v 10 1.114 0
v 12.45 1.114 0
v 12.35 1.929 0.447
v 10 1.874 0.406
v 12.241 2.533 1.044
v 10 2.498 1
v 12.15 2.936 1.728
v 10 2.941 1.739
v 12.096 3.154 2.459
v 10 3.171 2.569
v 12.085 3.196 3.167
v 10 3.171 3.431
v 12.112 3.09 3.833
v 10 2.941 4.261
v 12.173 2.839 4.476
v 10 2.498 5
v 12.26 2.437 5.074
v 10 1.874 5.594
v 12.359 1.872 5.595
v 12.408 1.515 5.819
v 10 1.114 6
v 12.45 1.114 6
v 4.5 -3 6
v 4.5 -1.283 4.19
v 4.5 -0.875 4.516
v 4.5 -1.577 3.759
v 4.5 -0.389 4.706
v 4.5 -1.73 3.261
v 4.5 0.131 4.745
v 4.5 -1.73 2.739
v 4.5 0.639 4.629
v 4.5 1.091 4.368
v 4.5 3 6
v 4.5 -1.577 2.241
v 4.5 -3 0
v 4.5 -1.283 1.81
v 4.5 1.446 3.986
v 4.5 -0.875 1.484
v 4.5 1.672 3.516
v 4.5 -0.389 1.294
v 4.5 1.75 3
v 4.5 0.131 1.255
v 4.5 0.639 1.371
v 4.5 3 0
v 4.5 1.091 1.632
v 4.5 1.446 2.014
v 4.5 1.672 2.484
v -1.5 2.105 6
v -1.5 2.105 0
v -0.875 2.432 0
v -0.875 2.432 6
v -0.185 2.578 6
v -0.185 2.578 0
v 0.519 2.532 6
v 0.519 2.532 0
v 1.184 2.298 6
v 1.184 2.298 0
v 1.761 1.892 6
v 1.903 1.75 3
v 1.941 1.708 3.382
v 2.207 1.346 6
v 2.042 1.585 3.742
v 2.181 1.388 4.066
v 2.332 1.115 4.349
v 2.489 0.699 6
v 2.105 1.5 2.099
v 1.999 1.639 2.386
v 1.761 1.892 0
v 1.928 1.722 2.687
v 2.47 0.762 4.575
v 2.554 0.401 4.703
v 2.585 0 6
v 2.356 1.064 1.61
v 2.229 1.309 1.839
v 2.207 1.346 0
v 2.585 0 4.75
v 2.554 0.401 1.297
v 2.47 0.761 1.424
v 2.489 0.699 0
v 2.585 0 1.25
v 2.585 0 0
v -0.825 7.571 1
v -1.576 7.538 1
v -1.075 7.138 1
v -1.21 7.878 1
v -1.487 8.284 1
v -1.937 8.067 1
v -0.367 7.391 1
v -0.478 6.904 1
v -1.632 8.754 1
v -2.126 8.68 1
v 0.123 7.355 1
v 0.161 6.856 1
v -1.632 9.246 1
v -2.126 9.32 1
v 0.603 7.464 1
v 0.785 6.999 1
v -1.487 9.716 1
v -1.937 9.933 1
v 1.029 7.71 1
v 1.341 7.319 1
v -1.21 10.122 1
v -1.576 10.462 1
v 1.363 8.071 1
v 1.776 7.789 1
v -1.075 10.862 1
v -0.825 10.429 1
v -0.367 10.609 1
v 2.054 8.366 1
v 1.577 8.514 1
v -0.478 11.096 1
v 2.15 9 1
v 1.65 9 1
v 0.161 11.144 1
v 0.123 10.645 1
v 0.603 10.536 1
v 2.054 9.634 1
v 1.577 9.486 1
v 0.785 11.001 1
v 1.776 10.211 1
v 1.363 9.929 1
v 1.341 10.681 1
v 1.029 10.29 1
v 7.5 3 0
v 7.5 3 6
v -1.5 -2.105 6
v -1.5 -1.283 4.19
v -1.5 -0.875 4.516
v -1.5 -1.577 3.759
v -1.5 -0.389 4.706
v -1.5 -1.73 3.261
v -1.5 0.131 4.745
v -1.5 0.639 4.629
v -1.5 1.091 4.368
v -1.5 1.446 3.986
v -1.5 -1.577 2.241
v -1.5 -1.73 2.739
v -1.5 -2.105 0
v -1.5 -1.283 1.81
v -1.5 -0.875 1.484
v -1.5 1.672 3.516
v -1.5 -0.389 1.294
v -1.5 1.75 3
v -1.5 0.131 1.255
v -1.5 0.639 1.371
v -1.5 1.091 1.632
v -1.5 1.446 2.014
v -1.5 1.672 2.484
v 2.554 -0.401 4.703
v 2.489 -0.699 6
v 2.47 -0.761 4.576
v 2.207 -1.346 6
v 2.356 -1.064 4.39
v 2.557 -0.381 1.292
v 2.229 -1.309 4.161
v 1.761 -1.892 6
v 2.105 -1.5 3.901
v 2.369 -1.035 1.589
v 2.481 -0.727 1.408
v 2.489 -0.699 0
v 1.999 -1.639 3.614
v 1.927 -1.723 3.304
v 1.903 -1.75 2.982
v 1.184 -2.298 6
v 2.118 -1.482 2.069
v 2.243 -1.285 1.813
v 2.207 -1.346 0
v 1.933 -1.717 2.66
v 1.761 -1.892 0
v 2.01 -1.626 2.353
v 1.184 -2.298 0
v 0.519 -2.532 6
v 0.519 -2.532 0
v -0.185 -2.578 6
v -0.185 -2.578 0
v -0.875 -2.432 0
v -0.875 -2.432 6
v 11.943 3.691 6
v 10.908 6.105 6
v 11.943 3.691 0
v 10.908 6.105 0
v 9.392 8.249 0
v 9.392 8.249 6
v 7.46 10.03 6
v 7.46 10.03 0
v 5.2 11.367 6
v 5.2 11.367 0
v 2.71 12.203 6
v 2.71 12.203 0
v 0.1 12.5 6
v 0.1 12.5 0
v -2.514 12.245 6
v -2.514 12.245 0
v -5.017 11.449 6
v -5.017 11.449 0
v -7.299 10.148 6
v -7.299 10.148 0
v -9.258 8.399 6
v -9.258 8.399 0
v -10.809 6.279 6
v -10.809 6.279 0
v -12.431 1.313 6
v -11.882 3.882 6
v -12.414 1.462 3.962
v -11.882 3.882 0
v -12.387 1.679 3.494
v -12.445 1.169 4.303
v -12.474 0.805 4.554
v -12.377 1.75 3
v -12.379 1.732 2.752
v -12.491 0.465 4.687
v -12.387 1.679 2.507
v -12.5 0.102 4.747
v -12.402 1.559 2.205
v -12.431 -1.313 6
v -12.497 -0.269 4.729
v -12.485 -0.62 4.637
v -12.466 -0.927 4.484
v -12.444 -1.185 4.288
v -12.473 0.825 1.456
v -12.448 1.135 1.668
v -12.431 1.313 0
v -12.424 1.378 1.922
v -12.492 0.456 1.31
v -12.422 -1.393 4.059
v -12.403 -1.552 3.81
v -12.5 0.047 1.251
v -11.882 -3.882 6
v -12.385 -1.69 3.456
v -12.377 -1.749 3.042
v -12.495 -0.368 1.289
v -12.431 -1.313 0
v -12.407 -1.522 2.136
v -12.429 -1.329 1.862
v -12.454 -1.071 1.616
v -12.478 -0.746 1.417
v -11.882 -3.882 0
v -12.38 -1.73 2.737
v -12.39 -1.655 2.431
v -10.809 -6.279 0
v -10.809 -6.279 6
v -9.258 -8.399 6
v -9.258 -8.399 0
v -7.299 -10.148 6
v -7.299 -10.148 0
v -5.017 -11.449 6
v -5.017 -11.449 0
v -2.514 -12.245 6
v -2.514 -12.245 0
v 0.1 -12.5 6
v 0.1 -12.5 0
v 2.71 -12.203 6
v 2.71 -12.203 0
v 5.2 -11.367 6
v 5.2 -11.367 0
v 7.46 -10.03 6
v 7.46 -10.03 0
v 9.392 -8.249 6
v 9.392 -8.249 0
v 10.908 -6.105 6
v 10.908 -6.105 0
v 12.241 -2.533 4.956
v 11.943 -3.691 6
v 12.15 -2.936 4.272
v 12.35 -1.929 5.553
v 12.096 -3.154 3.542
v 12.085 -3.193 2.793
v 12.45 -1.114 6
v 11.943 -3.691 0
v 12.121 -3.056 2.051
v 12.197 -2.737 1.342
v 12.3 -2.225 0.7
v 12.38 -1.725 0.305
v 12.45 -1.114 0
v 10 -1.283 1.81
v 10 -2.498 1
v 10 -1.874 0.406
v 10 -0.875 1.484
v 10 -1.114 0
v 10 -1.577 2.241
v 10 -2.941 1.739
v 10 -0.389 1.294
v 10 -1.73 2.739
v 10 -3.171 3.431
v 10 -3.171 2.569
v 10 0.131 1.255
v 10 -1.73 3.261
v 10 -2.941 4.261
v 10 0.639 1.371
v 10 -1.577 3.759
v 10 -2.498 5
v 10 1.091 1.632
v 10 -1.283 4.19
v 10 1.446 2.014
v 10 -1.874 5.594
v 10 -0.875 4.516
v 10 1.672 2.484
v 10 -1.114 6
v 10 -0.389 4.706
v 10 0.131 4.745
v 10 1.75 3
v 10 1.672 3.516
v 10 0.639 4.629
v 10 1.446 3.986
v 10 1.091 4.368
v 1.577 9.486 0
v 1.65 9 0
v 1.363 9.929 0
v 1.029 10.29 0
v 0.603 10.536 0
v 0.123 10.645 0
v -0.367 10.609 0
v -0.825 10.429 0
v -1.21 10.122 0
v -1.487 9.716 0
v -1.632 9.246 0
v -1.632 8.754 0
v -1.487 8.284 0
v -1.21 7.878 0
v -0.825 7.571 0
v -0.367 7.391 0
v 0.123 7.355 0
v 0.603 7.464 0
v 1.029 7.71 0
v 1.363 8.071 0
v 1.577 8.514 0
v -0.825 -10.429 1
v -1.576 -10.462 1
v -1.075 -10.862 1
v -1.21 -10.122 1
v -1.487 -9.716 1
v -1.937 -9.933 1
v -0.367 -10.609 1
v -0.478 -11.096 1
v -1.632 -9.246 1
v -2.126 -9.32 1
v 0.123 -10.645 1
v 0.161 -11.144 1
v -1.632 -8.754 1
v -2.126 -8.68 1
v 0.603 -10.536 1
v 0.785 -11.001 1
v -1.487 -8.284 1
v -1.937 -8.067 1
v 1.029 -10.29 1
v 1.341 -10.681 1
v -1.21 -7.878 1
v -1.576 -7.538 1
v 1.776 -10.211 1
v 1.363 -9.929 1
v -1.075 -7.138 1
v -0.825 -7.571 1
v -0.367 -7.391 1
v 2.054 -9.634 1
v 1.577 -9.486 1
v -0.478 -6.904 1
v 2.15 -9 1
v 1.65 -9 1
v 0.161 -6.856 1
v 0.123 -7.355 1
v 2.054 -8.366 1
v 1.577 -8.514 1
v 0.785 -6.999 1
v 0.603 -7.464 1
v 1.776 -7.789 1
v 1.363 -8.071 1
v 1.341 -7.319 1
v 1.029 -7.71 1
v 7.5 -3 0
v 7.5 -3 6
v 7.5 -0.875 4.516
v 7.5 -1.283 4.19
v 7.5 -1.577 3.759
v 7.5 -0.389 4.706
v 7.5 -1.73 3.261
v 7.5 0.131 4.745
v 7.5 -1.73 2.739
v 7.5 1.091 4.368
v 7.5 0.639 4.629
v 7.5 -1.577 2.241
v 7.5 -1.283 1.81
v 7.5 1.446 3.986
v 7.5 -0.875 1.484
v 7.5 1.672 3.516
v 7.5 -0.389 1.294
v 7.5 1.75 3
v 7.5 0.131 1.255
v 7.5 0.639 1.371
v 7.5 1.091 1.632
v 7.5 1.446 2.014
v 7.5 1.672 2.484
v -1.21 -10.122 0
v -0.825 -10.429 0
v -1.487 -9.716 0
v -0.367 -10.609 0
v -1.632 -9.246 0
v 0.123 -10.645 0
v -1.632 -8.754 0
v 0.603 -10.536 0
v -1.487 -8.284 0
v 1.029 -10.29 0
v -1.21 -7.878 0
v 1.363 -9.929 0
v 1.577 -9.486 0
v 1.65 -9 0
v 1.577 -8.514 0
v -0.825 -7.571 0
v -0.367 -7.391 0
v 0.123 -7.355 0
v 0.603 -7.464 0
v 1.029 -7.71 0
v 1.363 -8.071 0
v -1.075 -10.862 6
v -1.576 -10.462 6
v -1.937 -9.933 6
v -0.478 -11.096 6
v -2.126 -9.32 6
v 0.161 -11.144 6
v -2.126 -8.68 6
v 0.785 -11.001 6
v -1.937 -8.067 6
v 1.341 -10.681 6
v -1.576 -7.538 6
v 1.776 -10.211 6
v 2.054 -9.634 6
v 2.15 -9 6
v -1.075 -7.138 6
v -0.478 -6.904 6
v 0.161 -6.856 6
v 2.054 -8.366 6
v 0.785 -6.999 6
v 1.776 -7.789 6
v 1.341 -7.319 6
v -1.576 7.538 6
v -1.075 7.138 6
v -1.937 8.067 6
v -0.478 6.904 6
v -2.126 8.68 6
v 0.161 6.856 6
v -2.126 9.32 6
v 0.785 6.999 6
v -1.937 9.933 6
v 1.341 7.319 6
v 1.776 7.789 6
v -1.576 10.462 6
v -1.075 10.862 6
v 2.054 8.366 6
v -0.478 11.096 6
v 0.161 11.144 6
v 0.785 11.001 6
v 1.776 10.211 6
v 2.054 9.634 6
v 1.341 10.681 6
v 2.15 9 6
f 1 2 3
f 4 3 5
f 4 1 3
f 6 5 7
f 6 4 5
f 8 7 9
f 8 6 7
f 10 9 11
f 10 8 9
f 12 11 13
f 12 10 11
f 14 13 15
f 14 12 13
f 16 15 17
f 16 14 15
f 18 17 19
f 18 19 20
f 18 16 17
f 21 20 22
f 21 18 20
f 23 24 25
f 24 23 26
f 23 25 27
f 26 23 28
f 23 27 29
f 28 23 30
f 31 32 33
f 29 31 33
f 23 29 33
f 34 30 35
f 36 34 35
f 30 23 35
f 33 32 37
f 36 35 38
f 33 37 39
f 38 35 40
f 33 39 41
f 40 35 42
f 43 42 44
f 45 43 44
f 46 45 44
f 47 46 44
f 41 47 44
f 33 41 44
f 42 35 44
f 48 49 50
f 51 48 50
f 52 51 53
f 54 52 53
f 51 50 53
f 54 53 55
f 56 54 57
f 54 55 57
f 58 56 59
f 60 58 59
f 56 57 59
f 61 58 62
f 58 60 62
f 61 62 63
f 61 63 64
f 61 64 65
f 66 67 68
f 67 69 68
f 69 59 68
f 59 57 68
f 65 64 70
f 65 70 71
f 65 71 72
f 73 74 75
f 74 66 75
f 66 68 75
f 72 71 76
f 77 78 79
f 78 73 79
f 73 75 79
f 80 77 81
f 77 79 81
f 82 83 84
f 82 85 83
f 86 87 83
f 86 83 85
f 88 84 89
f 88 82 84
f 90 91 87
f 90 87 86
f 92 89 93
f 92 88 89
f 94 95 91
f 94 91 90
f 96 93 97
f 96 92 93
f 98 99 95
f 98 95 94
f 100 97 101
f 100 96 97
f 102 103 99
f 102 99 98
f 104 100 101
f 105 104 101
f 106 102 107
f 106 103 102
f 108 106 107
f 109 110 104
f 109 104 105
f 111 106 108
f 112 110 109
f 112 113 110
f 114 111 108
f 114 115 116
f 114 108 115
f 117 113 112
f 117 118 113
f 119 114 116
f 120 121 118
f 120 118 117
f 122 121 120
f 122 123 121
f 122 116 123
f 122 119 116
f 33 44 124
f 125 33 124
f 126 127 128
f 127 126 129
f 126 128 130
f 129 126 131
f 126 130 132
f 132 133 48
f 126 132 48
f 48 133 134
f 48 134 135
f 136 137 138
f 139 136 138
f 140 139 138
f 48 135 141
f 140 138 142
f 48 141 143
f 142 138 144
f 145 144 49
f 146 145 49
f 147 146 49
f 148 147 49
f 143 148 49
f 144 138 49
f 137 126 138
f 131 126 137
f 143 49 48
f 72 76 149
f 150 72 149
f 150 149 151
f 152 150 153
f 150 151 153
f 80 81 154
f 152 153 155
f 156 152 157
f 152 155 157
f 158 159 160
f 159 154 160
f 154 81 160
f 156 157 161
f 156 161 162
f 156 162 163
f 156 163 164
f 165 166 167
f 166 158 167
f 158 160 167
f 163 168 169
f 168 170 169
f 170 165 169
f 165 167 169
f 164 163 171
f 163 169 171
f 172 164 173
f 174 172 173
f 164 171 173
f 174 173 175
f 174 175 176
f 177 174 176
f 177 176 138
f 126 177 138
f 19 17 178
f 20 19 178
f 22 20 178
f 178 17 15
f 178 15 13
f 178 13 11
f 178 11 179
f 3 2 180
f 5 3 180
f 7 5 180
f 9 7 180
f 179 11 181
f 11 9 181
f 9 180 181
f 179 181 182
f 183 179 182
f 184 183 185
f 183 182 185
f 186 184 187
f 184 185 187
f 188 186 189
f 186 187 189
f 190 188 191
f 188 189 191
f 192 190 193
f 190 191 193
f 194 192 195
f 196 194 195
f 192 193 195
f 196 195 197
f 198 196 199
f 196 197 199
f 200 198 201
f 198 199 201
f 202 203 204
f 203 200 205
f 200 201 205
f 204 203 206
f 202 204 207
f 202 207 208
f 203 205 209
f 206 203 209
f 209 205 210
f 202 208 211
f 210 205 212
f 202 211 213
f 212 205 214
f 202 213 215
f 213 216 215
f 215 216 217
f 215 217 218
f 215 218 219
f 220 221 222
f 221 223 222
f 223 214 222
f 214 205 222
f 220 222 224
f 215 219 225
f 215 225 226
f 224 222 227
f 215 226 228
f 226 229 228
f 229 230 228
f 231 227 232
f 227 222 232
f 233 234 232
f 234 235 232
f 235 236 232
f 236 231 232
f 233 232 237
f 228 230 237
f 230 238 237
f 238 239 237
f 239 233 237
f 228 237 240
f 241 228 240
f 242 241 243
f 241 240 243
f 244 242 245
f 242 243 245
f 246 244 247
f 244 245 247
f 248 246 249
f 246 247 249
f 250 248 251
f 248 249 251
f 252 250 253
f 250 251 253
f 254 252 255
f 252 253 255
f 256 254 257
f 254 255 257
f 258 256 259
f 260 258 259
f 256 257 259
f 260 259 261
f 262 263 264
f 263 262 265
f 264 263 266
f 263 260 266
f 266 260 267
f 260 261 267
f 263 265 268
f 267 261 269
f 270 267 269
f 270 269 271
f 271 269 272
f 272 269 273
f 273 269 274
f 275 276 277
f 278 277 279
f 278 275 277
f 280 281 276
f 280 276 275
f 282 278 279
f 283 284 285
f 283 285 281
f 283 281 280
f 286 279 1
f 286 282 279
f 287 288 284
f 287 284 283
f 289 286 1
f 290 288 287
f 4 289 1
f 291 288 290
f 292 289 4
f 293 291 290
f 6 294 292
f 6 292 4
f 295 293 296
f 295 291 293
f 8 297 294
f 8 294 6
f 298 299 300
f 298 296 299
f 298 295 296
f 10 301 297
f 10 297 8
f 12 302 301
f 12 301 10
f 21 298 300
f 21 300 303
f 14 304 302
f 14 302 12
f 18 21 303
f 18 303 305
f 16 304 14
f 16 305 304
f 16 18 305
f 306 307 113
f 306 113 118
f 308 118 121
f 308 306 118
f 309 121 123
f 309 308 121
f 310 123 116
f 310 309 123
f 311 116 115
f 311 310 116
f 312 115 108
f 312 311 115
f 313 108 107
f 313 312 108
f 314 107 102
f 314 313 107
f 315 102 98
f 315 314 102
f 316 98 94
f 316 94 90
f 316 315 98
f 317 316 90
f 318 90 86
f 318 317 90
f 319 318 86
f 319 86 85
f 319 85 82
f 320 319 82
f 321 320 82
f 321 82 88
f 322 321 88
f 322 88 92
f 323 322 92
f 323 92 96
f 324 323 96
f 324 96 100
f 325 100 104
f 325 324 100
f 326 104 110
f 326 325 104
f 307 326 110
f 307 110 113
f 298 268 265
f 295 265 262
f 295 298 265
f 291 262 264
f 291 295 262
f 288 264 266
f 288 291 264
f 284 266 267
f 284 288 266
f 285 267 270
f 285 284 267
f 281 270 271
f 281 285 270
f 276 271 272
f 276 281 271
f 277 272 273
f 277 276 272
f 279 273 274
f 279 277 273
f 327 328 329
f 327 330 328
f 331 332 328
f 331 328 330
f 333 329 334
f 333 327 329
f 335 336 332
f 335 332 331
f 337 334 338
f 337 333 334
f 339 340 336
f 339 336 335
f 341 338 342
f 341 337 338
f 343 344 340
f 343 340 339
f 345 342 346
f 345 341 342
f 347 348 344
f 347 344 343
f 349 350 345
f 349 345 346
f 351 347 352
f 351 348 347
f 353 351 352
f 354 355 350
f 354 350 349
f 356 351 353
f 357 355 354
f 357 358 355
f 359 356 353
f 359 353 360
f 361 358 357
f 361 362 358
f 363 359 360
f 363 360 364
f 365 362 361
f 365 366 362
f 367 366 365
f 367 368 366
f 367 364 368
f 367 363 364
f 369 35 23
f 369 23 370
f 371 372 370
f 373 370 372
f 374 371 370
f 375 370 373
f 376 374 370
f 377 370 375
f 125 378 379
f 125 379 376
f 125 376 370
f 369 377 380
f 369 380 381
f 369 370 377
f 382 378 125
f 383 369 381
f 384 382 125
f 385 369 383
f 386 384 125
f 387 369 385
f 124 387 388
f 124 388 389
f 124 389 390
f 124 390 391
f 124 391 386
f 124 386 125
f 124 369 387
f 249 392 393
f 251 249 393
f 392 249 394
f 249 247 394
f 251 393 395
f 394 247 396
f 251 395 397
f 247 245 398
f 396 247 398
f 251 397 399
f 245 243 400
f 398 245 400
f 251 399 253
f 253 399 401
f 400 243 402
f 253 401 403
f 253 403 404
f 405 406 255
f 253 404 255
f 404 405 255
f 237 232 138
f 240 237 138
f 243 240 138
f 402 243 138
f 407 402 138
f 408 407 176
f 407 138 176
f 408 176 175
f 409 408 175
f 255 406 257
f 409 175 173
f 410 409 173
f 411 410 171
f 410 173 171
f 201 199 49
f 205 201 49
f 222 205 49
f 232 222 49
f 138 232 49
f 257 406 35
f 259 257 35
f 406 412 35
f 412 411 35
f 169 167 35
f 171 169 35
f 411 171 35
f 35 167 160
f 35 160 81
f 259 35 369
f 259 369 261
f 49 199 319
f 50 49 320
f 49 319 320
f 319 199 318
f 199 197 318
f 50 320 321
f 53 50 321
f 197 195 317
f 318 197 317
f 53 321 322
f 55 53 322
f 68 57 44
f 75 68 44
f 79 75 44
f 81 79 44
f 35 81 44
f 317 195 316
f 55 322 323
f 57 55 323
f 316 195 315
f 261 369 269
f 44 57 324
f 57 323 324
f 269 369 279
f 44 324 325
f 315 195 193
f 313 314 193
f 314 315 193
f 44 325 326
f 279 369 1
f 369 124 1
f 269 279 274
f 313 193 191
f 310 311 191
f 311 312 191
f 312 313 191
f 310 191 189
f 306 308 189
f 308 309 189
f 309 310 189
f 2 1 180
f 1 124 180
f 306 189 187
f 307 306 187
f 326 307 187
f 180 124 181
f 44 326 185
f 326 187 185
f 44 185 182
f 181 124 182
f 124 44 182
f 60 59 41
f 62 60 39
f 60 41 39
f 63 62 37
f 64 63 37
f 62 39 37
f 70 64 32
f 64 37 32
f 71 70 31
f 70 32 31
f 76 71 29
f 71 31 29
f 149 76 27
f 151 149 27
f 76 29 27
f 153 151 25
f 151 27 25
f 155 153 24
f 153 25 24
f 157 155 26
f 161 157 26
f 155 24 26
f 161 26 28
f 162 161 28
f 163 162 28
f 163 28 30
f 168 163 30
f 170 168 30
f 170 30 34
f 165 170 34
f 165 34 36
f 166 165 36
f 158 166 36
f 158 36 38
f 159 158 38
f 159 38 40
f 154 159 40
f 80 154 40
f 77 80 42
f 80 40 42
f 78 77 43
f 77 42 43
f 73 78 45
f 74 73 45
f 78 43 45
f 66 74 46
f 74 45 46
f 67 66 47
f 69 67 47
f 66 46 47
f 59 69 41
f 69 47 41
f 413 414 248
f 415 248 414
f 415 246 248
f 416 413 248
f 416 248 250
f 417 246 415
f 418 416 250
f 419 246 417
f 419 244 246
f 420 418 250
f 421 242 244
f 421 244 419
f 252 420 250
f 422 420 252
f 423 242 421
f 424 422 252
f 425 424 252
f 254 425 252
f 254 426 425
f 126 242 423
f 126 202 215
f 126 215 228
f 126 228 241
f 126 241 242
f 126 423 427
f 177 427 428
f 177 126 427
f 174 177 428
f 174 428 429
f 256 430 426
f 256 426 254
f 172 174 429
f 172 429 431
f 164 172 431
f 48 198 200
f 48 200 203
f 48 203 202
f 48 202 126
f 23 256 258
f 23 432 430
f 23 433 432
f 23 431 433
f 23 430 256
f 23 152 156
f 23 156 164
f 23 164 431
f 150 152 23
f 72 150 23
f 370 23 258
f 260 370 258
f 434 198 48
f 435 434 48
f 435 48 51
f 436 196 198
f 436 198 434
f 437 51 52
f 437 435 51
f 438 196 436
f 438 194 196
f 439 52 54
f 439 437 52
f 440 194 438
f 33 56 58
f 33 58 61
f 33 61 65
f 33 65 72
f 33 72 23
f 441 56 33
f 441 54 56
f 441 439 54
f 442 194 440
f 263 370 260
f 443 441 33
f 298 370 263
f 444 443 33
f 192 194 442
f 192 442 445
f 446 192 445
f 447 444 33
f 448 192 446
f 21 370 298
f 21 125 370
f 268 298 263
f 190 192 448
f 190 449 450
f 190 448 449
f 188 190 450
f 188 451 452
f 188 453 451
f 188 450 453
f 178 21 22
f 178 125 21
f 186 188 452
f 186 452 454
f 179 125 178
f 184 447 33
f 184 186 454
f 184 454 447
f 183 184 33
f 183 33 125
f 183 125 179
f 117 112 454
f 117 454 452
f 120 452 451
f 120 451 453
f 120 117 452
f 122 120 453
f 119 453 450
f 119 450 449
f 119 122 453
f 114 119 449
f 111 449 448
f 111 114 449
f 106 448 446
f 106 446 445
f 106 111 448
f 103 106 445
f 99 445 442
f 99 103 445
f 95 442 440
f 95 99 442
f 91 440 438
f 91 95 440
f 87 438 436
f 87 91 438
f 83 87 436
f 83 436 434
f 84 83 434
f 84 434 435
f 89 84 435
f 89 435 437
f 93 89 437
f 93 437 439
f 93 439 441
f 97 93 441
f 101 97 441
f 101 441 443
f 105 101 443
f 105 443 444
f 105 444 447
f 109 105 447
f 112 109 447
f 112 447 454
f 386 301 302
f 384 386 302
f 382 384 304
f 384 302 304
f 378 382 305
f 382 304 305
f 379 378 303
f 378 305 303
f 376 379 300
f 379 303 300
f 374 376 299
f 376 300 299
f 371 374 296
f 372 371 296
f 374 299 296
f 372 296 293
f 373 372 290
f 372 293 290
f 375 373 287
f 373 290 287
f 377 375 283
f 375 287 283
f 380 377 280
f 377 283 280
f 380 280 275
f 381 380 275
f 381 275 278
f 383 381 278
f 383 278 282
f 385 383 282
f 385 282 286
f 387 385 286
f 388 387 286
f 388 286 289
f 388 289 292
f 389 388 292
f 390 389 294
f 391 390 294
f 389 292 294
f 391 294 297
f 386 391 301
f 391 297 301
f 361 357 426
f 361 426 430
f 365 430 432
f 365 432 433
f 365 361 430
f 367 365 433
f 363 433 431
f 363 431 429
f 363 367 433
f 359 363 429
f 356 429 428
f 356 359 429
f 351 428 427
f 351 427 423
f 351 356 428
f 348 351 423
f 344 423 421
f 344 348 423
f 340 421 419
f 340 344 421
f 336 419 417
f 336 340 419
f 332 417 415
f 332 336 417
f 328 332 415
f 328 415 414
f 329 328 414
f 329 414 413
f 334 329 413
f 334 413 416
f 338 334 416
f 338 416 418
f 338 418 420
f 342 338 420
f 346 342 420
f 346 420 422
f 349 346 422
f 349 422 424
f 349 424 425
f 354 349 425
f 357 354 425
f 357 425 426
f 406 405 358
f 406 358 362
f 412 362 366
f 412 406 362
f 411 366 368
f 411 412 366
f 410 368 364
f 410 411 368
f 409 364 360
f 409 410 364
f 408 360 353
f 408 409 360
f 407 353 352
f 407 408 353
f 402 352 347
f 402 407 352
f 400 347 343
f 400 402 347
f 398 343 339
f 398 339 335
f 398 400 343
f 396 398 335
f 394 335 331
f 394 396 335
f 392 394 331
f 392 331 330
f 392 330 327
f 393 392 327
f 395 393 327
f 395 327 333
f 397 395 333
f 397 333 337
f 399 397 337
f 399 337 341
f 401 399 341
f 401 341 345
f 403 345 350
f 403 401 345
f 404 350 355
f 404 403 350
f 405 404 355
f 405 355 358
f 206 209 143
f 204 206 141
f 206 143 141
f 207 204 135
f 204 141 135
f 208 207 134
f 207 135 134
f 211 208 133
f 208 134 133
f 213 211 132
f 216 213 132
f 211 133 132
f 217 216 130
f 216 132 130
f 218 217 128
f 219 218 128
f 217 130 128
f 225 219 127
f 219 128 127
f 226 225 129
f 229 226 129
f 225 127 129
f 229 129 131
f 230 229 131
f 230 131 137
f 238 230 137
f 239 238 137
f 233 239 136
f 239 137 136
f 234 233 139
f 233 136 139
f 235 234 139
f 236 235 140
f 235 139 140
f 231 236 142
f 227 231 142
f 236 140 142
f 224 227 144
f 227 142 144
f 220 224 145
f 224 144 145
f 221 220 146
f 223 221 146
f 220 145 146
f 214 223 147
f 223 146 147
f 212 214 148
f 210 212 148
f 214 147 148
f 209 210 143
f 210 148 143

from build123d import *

# Parameters (mm, degrees)
F0_R     = 12.5
F0_R_2   = 2.15
F0_W     = 3
F0_H     = 6
F1_DEPTH = 6
F0_R_3   = 1.65
F2_DEPTH = 1
F3_R     = 1.75
F4_DEPTH = 12.5
F5_START = 10
F3_R_2   = 3.2
F5_DEPTH = 15


with BuildPart() as f1:
    # F0 (on Top) → F1 (new body)
    with BuildSketch(Plane.XY):
        Circle(F0_R)
        with Locations((0, -9)):
            Circle(F0_R_2, mode=Mode.SUBTRACT)
        with BuildLine():
            ThreePointArc((-1.5, 2.1052850163), (1.1842138743, 2.2977951388), (2.585, 0))
            ThreePointArc((2.585, 0), (1.1842138743, -2.2977951388), (-1.5, -2.1052850163))
            ThreePointArc((-1.5, -2.1052850163), (-2.585, 0), (-1.5, 2.1052850163))
        make_face(mode=Mode.SUBTRACT)
        with Locations((6, 0)):
            Rectangle(F0_W, F0_H, mode=Mode.SUBTRACT)
        with Locations((0, 9)):
            Circle(F0_R_2, mode=Mode.SUBTRACT)
        with BuildLine():
            Line((-1.5, -2.1052850163), (-1.5, 2.1052850163))
            ThreePointArc((-1.5, 2.1052850163), (-2.585, 0), (-1.5, -2.1052850163))
        make_face()
    extrude(amount=F1_DEPTH)

    # F0 (on Top) → F2 (join)
    with BuildSketch(Plane.XY):
        with Locations((0, 9)):
            Circle(F0_R_2)
        with Locations((0, 9)):
            Circle(F0_R_3, mode=Mode.SUBTRACT)
        with Locations((0, -9)):
            Circle(F0_R_2)
        with Locations((0, -9)):
            Circle(F0_R_3, mode=Mode.SUBTRACT)
    extrude(amount=F2_DEPTH)

    # F3 (on Right) → F4 (cut, symmetric)
    with BuildSketch(Plane.YZ):
        with Locations((0, 3)):
            Circle(F3_R)
    extrude(amount=F4_DEPTH, both=True, mode=Mode.SUBTRACT)

    # F3 (on Right) → F5 (cut)
    with BuildSketch(Plane.YZ.offset(F5_START)):
        with Locations((0, 3)):
            Circle(F3_R_2)
        with Locations((0, 3)):
            Circle(F3_R, mode=Mode.SUBTRACT)
    extrude(amount=F5_DEPTH, mode=Mode.SUBTRACT)


solid = f1.part
